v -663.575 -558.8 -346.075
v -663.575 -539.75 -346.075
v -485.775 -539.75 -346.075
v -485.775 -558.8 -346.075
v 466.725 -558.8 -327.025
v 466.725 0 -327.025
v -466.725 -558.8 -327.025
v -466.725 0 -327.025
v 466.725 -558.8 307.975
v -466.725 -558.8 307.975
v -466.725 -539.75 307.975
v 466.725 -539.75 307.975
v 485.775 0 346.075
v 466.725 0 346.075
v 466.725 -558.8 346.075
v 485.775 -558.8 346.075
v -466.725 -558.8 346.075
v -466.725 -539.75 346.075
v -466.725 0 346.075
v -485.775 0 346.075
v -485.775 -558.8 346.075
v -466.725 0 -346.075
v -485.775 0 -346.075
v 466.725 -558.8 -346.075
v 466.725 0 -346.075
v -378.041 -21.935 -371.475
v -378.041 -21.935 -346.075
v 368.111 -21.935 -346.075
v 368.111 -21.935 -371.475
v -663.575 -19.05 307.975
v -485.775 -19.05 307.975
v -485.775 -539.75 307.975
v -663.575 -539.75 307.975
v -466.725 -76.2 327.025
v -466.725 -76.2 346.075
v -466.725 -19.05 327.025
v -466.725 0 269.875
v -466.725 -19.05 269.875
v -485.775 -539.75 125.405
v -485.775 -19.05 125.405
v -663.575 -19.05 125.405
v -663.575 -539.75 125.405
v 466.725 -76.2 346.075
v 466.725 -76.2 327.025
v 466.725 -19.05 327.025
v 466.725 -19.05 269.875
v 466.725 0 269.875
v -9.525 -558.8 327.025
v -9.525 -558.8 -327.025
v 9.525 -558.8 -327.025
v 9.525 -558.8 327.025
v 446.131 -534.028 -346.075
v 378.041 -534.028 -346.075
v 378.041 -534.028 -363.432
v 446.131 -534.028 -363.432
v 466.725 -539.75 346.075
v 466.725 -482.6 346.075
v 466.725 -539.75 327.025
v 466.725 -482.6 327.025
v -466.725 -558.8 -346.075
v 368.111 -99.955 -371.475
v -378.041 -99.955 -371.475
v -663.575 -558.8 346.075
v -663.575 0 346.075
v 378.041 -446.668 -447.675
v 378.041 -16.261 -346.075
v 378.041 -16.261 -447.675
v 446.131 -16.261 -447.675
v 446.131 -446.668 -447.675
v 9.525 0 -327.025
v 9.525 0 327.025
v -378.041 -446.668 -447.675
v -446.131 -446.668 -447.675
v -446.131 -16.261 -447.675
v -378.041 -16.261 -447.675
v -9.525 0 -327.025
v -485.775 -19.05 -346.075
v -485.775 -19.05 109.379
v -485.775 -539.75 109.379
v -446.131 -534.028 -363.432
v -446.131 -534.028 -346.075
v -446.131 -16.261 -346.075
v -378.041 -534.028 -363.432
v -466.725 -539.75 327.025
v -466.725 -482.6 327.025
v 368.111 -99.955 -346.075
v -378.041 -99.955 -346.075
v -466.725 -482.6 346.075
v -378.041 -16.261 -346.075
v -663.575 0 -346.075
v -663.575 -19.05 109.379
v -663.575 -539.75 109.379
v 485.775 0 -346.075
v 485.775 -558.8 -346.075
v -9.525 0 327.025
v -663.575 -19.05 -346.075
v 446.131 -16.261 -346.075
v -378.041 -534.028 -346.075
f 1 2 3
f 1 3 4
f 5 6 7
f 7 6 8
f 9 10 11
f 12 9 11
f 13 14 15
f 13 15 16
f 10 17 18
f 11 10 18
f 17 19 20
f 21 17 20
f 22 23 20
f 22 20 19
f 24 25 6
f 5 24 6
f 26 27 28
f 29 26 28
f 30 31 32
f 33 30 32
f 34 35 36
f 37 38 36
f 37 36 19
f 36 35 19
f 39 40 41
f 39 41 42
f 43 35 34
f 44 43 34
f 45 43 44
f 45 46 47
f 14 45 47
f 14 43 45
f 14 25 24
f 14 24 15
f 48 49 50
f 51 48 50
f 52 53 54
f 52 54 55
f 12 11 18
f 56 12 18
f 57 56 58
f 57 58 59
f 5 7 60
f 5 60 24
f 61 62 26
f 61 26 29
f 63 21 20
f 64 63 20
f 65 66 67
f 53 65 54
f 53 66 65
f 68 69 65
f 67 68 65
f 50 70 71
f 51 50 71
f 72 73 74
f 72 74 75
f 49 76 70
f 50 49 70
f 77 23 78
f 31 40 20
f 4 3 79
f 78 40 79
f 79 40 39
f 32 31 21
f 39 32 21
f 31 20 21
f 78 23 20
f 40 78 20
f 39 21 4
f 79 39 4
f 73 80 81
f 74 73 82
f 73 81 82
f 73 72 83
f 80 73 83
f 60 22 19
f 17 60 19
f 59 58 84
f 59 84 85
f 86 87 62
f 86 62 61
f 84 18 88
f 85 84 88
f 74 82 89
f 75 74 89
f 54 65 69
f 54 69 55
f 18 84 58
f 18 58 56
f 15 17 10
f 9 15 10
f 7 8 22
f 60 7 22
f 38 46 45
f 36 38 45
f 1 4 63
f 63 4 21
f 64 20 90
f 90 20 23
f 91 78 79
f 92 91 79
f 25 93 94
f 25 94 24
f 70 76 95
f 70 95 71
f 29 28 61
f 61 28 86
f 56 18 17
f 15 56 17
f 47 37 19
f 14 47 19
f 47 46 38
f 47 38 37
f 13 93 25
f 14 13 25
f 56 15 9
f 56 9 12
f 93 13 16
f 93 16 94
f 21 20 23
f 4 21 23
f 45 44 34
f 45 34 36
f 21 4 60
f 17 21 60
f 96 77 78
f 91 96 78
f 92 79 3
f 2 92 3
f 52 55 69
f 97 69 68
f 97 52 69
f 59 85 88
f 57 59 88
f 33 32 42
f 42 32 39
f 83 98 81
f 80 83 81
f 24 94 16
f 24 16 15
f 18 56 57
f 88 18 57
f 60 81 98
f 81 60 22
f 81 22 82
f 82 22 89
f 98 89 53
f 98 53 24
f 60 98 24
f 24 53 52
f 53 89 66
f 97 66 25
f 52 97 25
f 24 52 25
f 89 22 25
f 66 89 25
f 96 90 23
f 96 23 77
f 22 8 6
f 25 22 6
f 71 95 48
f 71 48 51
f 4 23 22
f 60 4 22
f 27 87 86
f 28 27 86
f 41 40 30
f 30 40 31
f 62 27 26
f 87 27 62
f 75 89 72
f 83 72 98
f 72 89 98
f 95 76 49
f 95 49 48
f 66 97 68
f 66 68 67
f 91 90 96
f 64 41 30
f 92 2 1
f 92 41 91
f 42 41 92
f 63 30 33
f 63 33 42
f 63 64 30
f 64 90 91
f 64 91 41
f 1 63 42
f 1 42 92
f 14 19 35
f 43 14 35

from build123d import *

# Parameters (mm, degrees)
F1_DEPTH  = 558.8
F2_DEPTH  = 558.8
F0_W      = 19.05
F0_H      = 654.05
F4_DEPTH  = 558.8
F6_DEPTH  = 933.45
F5_W      = 57.15
F5_H      = 19.05
F7_DEPTH  = 933.45
F5_W_2    = 19.05
F5_H_2    = 57.15
F8_W      = 520.7
F8_H      = 38.1
F8_H_2    = 16.0259231925
F9_DEPTH  = 177.8
F10_W     = 746.152639389
F10_H     = 78.0197512358
F11_DEPTH = 25.4
F12_DEPTH = 101.6
F14_DEPTH = 101.6


with BuildPart() as f1:
    # F0 (on Front) → F1 (new body)
    with BuildSketch(Plane.XZ):
        Polygon((-466.725, 346.075), (-485.775, 346.075), (-485.775, -346.075), (-466.725, -346.075), (-466.725, -327.025), (-466.725, 327.025), align=None)
    extrude(amount=F1_DEPTH)


with BuildPart() as f2:
    # F0 (on Front) → F2 (new body)
    with BuildSketch(Plane.XZ):
        Polygon((-466.725, -327.025), (-466.725, -346.075), (466.725, -346.075), (466.725, -327.025), (9.525, -327.025), (-9.525, -327.025), align=None)
    extrude(amount=F2_DEPTH)



with BuildPart() as f3_1:
    # F3: instance of F1
    add(f1.part.mirror(Plane.YZ))


with BuildPart() as f4:
    # F0 (on Front) → F4 (new body)
    with BuildSketch(Plane.XZ):
        Rectangle(F0_W, F0_H)
    extrude(amount=F4_DEPTH)


with BuildPart() as f6:
    # F5 (on face) → F6 (new body, through all)
    with BuildSketch(Plane.YZ.offset(-466.725)):
        Polygon((-539.75, 346.075), (-558.8, 346.075), (-558.8, 307.975), (-539.75, 307.975), (-539.75, 327.025), align=None)
    extrude(amount=F6_DEPTH)


with BuildPart() as f7:
    # F5 (on face) → F7 (new body, through all)
    with BuildSketch(Plane.YZ.offset(-466.725)):
        with Locations((-511.175, 336.55)):
            Rectangle(F5_W, F5_H)
    extrude(amount=F7_DEPTH)


with BuildPart() as f7b:
    # F5 (on face) → F7, piece 2 (new body, through all)
    with BuildSketch(Plane.YZ.offset(-466.725)):
        Polygon((0, 346.075), (-76.2, 346.075), (-76.2, 327.025), (-19.05, 327.025), (0, 327.025), align=None)
        with Locations((-9.525, 298.45)):
            Rectangle(F5_W_2, F5_H_2)
    extrude(amount=F7_DEPTH)


with BuildPart() as f9:
    # F8 (on face) → F9 (new body)
    with BuildSketch(Plane(origin=(-485.775, 0, 0), x_dir=(0, -1, 0), z_dir=(-1, 0, 0))):
        Polygon((558.8, 346.075), (539.75, 346.075), (539.75, 307.975), (539.75, 125.404715538), (539.75, 109.3787923455), (539.75, -346.075), (558.8, -346.075), align=None)
        with Locations((279.4, 327.025)):
            Rectangle(F8_W, F8_H)
        with Locations((279.4, 117.3917539418)):
            Rectangle(F8_W, F8_H_2)
        Polygon((19.05, 346.075), (0, 346.075), (0, -346.075), (19.05, -346.075), (19.05, 109.3787923455), (19.05, 125.404715538), (19.05, 307.975), align=None)
    extrude(amount=F9_DEPTH)


with BuildPart() as f11:
    # F10 (on face) → F11 (new body)
    with BuildSketch(Plane(origin=(0, 0, -346.075), x_dir=(1, 0, 0), z_dir=(0, 0, -1))):
        with Locations((-4.9648880959, 60.9446624294)):
            Rectangle(F10_W, F10_H)
    extrude(amount=F11_DEPTH)


with BuildPart() as f12:
    # F10 (on face) → F12 (new body)
    with BuildSketch(Plane(origin=(0, 0, -346.075), x_dir=(1, 0, 0), z_dir=(0, 0, -1))):
        Polygon((-378.0412077904, 534.028172493), (-446.1311995983, 534.028172493), (-446.1311995983, 16.260612756), (-378.0412077904, 16.260612756), (-378.0412077904, 21.9347868115), (-378.0412077904, 99.9545380473), align=None)
    extrude(amount=F12_DEPTH)

    # F13 (on face) → F14 (cut)
    with BuildSketch(Plane.YZ.offset(-378.0412077904)):
        Polygon((-446.6676414013, -447.675), (-534.028172493, -363.4320497513), (-534.028172493, -447.675), align=None)
    extrude(amount=-F14_DEPTH, mode=Mode.SUBTRACT)


with BuildPart() as f2_1:
    add(f2.part)

    add(f12.part)  # F15 merges F12
    # F15: F12 across plane
    add(f12.part.mirror(Plane.YZ))


solid = Compound([f1.part, f3_1.part, f4.part, f6.part, f7.part, f7b.part, f9.part, f11.part, f2_1.part])
